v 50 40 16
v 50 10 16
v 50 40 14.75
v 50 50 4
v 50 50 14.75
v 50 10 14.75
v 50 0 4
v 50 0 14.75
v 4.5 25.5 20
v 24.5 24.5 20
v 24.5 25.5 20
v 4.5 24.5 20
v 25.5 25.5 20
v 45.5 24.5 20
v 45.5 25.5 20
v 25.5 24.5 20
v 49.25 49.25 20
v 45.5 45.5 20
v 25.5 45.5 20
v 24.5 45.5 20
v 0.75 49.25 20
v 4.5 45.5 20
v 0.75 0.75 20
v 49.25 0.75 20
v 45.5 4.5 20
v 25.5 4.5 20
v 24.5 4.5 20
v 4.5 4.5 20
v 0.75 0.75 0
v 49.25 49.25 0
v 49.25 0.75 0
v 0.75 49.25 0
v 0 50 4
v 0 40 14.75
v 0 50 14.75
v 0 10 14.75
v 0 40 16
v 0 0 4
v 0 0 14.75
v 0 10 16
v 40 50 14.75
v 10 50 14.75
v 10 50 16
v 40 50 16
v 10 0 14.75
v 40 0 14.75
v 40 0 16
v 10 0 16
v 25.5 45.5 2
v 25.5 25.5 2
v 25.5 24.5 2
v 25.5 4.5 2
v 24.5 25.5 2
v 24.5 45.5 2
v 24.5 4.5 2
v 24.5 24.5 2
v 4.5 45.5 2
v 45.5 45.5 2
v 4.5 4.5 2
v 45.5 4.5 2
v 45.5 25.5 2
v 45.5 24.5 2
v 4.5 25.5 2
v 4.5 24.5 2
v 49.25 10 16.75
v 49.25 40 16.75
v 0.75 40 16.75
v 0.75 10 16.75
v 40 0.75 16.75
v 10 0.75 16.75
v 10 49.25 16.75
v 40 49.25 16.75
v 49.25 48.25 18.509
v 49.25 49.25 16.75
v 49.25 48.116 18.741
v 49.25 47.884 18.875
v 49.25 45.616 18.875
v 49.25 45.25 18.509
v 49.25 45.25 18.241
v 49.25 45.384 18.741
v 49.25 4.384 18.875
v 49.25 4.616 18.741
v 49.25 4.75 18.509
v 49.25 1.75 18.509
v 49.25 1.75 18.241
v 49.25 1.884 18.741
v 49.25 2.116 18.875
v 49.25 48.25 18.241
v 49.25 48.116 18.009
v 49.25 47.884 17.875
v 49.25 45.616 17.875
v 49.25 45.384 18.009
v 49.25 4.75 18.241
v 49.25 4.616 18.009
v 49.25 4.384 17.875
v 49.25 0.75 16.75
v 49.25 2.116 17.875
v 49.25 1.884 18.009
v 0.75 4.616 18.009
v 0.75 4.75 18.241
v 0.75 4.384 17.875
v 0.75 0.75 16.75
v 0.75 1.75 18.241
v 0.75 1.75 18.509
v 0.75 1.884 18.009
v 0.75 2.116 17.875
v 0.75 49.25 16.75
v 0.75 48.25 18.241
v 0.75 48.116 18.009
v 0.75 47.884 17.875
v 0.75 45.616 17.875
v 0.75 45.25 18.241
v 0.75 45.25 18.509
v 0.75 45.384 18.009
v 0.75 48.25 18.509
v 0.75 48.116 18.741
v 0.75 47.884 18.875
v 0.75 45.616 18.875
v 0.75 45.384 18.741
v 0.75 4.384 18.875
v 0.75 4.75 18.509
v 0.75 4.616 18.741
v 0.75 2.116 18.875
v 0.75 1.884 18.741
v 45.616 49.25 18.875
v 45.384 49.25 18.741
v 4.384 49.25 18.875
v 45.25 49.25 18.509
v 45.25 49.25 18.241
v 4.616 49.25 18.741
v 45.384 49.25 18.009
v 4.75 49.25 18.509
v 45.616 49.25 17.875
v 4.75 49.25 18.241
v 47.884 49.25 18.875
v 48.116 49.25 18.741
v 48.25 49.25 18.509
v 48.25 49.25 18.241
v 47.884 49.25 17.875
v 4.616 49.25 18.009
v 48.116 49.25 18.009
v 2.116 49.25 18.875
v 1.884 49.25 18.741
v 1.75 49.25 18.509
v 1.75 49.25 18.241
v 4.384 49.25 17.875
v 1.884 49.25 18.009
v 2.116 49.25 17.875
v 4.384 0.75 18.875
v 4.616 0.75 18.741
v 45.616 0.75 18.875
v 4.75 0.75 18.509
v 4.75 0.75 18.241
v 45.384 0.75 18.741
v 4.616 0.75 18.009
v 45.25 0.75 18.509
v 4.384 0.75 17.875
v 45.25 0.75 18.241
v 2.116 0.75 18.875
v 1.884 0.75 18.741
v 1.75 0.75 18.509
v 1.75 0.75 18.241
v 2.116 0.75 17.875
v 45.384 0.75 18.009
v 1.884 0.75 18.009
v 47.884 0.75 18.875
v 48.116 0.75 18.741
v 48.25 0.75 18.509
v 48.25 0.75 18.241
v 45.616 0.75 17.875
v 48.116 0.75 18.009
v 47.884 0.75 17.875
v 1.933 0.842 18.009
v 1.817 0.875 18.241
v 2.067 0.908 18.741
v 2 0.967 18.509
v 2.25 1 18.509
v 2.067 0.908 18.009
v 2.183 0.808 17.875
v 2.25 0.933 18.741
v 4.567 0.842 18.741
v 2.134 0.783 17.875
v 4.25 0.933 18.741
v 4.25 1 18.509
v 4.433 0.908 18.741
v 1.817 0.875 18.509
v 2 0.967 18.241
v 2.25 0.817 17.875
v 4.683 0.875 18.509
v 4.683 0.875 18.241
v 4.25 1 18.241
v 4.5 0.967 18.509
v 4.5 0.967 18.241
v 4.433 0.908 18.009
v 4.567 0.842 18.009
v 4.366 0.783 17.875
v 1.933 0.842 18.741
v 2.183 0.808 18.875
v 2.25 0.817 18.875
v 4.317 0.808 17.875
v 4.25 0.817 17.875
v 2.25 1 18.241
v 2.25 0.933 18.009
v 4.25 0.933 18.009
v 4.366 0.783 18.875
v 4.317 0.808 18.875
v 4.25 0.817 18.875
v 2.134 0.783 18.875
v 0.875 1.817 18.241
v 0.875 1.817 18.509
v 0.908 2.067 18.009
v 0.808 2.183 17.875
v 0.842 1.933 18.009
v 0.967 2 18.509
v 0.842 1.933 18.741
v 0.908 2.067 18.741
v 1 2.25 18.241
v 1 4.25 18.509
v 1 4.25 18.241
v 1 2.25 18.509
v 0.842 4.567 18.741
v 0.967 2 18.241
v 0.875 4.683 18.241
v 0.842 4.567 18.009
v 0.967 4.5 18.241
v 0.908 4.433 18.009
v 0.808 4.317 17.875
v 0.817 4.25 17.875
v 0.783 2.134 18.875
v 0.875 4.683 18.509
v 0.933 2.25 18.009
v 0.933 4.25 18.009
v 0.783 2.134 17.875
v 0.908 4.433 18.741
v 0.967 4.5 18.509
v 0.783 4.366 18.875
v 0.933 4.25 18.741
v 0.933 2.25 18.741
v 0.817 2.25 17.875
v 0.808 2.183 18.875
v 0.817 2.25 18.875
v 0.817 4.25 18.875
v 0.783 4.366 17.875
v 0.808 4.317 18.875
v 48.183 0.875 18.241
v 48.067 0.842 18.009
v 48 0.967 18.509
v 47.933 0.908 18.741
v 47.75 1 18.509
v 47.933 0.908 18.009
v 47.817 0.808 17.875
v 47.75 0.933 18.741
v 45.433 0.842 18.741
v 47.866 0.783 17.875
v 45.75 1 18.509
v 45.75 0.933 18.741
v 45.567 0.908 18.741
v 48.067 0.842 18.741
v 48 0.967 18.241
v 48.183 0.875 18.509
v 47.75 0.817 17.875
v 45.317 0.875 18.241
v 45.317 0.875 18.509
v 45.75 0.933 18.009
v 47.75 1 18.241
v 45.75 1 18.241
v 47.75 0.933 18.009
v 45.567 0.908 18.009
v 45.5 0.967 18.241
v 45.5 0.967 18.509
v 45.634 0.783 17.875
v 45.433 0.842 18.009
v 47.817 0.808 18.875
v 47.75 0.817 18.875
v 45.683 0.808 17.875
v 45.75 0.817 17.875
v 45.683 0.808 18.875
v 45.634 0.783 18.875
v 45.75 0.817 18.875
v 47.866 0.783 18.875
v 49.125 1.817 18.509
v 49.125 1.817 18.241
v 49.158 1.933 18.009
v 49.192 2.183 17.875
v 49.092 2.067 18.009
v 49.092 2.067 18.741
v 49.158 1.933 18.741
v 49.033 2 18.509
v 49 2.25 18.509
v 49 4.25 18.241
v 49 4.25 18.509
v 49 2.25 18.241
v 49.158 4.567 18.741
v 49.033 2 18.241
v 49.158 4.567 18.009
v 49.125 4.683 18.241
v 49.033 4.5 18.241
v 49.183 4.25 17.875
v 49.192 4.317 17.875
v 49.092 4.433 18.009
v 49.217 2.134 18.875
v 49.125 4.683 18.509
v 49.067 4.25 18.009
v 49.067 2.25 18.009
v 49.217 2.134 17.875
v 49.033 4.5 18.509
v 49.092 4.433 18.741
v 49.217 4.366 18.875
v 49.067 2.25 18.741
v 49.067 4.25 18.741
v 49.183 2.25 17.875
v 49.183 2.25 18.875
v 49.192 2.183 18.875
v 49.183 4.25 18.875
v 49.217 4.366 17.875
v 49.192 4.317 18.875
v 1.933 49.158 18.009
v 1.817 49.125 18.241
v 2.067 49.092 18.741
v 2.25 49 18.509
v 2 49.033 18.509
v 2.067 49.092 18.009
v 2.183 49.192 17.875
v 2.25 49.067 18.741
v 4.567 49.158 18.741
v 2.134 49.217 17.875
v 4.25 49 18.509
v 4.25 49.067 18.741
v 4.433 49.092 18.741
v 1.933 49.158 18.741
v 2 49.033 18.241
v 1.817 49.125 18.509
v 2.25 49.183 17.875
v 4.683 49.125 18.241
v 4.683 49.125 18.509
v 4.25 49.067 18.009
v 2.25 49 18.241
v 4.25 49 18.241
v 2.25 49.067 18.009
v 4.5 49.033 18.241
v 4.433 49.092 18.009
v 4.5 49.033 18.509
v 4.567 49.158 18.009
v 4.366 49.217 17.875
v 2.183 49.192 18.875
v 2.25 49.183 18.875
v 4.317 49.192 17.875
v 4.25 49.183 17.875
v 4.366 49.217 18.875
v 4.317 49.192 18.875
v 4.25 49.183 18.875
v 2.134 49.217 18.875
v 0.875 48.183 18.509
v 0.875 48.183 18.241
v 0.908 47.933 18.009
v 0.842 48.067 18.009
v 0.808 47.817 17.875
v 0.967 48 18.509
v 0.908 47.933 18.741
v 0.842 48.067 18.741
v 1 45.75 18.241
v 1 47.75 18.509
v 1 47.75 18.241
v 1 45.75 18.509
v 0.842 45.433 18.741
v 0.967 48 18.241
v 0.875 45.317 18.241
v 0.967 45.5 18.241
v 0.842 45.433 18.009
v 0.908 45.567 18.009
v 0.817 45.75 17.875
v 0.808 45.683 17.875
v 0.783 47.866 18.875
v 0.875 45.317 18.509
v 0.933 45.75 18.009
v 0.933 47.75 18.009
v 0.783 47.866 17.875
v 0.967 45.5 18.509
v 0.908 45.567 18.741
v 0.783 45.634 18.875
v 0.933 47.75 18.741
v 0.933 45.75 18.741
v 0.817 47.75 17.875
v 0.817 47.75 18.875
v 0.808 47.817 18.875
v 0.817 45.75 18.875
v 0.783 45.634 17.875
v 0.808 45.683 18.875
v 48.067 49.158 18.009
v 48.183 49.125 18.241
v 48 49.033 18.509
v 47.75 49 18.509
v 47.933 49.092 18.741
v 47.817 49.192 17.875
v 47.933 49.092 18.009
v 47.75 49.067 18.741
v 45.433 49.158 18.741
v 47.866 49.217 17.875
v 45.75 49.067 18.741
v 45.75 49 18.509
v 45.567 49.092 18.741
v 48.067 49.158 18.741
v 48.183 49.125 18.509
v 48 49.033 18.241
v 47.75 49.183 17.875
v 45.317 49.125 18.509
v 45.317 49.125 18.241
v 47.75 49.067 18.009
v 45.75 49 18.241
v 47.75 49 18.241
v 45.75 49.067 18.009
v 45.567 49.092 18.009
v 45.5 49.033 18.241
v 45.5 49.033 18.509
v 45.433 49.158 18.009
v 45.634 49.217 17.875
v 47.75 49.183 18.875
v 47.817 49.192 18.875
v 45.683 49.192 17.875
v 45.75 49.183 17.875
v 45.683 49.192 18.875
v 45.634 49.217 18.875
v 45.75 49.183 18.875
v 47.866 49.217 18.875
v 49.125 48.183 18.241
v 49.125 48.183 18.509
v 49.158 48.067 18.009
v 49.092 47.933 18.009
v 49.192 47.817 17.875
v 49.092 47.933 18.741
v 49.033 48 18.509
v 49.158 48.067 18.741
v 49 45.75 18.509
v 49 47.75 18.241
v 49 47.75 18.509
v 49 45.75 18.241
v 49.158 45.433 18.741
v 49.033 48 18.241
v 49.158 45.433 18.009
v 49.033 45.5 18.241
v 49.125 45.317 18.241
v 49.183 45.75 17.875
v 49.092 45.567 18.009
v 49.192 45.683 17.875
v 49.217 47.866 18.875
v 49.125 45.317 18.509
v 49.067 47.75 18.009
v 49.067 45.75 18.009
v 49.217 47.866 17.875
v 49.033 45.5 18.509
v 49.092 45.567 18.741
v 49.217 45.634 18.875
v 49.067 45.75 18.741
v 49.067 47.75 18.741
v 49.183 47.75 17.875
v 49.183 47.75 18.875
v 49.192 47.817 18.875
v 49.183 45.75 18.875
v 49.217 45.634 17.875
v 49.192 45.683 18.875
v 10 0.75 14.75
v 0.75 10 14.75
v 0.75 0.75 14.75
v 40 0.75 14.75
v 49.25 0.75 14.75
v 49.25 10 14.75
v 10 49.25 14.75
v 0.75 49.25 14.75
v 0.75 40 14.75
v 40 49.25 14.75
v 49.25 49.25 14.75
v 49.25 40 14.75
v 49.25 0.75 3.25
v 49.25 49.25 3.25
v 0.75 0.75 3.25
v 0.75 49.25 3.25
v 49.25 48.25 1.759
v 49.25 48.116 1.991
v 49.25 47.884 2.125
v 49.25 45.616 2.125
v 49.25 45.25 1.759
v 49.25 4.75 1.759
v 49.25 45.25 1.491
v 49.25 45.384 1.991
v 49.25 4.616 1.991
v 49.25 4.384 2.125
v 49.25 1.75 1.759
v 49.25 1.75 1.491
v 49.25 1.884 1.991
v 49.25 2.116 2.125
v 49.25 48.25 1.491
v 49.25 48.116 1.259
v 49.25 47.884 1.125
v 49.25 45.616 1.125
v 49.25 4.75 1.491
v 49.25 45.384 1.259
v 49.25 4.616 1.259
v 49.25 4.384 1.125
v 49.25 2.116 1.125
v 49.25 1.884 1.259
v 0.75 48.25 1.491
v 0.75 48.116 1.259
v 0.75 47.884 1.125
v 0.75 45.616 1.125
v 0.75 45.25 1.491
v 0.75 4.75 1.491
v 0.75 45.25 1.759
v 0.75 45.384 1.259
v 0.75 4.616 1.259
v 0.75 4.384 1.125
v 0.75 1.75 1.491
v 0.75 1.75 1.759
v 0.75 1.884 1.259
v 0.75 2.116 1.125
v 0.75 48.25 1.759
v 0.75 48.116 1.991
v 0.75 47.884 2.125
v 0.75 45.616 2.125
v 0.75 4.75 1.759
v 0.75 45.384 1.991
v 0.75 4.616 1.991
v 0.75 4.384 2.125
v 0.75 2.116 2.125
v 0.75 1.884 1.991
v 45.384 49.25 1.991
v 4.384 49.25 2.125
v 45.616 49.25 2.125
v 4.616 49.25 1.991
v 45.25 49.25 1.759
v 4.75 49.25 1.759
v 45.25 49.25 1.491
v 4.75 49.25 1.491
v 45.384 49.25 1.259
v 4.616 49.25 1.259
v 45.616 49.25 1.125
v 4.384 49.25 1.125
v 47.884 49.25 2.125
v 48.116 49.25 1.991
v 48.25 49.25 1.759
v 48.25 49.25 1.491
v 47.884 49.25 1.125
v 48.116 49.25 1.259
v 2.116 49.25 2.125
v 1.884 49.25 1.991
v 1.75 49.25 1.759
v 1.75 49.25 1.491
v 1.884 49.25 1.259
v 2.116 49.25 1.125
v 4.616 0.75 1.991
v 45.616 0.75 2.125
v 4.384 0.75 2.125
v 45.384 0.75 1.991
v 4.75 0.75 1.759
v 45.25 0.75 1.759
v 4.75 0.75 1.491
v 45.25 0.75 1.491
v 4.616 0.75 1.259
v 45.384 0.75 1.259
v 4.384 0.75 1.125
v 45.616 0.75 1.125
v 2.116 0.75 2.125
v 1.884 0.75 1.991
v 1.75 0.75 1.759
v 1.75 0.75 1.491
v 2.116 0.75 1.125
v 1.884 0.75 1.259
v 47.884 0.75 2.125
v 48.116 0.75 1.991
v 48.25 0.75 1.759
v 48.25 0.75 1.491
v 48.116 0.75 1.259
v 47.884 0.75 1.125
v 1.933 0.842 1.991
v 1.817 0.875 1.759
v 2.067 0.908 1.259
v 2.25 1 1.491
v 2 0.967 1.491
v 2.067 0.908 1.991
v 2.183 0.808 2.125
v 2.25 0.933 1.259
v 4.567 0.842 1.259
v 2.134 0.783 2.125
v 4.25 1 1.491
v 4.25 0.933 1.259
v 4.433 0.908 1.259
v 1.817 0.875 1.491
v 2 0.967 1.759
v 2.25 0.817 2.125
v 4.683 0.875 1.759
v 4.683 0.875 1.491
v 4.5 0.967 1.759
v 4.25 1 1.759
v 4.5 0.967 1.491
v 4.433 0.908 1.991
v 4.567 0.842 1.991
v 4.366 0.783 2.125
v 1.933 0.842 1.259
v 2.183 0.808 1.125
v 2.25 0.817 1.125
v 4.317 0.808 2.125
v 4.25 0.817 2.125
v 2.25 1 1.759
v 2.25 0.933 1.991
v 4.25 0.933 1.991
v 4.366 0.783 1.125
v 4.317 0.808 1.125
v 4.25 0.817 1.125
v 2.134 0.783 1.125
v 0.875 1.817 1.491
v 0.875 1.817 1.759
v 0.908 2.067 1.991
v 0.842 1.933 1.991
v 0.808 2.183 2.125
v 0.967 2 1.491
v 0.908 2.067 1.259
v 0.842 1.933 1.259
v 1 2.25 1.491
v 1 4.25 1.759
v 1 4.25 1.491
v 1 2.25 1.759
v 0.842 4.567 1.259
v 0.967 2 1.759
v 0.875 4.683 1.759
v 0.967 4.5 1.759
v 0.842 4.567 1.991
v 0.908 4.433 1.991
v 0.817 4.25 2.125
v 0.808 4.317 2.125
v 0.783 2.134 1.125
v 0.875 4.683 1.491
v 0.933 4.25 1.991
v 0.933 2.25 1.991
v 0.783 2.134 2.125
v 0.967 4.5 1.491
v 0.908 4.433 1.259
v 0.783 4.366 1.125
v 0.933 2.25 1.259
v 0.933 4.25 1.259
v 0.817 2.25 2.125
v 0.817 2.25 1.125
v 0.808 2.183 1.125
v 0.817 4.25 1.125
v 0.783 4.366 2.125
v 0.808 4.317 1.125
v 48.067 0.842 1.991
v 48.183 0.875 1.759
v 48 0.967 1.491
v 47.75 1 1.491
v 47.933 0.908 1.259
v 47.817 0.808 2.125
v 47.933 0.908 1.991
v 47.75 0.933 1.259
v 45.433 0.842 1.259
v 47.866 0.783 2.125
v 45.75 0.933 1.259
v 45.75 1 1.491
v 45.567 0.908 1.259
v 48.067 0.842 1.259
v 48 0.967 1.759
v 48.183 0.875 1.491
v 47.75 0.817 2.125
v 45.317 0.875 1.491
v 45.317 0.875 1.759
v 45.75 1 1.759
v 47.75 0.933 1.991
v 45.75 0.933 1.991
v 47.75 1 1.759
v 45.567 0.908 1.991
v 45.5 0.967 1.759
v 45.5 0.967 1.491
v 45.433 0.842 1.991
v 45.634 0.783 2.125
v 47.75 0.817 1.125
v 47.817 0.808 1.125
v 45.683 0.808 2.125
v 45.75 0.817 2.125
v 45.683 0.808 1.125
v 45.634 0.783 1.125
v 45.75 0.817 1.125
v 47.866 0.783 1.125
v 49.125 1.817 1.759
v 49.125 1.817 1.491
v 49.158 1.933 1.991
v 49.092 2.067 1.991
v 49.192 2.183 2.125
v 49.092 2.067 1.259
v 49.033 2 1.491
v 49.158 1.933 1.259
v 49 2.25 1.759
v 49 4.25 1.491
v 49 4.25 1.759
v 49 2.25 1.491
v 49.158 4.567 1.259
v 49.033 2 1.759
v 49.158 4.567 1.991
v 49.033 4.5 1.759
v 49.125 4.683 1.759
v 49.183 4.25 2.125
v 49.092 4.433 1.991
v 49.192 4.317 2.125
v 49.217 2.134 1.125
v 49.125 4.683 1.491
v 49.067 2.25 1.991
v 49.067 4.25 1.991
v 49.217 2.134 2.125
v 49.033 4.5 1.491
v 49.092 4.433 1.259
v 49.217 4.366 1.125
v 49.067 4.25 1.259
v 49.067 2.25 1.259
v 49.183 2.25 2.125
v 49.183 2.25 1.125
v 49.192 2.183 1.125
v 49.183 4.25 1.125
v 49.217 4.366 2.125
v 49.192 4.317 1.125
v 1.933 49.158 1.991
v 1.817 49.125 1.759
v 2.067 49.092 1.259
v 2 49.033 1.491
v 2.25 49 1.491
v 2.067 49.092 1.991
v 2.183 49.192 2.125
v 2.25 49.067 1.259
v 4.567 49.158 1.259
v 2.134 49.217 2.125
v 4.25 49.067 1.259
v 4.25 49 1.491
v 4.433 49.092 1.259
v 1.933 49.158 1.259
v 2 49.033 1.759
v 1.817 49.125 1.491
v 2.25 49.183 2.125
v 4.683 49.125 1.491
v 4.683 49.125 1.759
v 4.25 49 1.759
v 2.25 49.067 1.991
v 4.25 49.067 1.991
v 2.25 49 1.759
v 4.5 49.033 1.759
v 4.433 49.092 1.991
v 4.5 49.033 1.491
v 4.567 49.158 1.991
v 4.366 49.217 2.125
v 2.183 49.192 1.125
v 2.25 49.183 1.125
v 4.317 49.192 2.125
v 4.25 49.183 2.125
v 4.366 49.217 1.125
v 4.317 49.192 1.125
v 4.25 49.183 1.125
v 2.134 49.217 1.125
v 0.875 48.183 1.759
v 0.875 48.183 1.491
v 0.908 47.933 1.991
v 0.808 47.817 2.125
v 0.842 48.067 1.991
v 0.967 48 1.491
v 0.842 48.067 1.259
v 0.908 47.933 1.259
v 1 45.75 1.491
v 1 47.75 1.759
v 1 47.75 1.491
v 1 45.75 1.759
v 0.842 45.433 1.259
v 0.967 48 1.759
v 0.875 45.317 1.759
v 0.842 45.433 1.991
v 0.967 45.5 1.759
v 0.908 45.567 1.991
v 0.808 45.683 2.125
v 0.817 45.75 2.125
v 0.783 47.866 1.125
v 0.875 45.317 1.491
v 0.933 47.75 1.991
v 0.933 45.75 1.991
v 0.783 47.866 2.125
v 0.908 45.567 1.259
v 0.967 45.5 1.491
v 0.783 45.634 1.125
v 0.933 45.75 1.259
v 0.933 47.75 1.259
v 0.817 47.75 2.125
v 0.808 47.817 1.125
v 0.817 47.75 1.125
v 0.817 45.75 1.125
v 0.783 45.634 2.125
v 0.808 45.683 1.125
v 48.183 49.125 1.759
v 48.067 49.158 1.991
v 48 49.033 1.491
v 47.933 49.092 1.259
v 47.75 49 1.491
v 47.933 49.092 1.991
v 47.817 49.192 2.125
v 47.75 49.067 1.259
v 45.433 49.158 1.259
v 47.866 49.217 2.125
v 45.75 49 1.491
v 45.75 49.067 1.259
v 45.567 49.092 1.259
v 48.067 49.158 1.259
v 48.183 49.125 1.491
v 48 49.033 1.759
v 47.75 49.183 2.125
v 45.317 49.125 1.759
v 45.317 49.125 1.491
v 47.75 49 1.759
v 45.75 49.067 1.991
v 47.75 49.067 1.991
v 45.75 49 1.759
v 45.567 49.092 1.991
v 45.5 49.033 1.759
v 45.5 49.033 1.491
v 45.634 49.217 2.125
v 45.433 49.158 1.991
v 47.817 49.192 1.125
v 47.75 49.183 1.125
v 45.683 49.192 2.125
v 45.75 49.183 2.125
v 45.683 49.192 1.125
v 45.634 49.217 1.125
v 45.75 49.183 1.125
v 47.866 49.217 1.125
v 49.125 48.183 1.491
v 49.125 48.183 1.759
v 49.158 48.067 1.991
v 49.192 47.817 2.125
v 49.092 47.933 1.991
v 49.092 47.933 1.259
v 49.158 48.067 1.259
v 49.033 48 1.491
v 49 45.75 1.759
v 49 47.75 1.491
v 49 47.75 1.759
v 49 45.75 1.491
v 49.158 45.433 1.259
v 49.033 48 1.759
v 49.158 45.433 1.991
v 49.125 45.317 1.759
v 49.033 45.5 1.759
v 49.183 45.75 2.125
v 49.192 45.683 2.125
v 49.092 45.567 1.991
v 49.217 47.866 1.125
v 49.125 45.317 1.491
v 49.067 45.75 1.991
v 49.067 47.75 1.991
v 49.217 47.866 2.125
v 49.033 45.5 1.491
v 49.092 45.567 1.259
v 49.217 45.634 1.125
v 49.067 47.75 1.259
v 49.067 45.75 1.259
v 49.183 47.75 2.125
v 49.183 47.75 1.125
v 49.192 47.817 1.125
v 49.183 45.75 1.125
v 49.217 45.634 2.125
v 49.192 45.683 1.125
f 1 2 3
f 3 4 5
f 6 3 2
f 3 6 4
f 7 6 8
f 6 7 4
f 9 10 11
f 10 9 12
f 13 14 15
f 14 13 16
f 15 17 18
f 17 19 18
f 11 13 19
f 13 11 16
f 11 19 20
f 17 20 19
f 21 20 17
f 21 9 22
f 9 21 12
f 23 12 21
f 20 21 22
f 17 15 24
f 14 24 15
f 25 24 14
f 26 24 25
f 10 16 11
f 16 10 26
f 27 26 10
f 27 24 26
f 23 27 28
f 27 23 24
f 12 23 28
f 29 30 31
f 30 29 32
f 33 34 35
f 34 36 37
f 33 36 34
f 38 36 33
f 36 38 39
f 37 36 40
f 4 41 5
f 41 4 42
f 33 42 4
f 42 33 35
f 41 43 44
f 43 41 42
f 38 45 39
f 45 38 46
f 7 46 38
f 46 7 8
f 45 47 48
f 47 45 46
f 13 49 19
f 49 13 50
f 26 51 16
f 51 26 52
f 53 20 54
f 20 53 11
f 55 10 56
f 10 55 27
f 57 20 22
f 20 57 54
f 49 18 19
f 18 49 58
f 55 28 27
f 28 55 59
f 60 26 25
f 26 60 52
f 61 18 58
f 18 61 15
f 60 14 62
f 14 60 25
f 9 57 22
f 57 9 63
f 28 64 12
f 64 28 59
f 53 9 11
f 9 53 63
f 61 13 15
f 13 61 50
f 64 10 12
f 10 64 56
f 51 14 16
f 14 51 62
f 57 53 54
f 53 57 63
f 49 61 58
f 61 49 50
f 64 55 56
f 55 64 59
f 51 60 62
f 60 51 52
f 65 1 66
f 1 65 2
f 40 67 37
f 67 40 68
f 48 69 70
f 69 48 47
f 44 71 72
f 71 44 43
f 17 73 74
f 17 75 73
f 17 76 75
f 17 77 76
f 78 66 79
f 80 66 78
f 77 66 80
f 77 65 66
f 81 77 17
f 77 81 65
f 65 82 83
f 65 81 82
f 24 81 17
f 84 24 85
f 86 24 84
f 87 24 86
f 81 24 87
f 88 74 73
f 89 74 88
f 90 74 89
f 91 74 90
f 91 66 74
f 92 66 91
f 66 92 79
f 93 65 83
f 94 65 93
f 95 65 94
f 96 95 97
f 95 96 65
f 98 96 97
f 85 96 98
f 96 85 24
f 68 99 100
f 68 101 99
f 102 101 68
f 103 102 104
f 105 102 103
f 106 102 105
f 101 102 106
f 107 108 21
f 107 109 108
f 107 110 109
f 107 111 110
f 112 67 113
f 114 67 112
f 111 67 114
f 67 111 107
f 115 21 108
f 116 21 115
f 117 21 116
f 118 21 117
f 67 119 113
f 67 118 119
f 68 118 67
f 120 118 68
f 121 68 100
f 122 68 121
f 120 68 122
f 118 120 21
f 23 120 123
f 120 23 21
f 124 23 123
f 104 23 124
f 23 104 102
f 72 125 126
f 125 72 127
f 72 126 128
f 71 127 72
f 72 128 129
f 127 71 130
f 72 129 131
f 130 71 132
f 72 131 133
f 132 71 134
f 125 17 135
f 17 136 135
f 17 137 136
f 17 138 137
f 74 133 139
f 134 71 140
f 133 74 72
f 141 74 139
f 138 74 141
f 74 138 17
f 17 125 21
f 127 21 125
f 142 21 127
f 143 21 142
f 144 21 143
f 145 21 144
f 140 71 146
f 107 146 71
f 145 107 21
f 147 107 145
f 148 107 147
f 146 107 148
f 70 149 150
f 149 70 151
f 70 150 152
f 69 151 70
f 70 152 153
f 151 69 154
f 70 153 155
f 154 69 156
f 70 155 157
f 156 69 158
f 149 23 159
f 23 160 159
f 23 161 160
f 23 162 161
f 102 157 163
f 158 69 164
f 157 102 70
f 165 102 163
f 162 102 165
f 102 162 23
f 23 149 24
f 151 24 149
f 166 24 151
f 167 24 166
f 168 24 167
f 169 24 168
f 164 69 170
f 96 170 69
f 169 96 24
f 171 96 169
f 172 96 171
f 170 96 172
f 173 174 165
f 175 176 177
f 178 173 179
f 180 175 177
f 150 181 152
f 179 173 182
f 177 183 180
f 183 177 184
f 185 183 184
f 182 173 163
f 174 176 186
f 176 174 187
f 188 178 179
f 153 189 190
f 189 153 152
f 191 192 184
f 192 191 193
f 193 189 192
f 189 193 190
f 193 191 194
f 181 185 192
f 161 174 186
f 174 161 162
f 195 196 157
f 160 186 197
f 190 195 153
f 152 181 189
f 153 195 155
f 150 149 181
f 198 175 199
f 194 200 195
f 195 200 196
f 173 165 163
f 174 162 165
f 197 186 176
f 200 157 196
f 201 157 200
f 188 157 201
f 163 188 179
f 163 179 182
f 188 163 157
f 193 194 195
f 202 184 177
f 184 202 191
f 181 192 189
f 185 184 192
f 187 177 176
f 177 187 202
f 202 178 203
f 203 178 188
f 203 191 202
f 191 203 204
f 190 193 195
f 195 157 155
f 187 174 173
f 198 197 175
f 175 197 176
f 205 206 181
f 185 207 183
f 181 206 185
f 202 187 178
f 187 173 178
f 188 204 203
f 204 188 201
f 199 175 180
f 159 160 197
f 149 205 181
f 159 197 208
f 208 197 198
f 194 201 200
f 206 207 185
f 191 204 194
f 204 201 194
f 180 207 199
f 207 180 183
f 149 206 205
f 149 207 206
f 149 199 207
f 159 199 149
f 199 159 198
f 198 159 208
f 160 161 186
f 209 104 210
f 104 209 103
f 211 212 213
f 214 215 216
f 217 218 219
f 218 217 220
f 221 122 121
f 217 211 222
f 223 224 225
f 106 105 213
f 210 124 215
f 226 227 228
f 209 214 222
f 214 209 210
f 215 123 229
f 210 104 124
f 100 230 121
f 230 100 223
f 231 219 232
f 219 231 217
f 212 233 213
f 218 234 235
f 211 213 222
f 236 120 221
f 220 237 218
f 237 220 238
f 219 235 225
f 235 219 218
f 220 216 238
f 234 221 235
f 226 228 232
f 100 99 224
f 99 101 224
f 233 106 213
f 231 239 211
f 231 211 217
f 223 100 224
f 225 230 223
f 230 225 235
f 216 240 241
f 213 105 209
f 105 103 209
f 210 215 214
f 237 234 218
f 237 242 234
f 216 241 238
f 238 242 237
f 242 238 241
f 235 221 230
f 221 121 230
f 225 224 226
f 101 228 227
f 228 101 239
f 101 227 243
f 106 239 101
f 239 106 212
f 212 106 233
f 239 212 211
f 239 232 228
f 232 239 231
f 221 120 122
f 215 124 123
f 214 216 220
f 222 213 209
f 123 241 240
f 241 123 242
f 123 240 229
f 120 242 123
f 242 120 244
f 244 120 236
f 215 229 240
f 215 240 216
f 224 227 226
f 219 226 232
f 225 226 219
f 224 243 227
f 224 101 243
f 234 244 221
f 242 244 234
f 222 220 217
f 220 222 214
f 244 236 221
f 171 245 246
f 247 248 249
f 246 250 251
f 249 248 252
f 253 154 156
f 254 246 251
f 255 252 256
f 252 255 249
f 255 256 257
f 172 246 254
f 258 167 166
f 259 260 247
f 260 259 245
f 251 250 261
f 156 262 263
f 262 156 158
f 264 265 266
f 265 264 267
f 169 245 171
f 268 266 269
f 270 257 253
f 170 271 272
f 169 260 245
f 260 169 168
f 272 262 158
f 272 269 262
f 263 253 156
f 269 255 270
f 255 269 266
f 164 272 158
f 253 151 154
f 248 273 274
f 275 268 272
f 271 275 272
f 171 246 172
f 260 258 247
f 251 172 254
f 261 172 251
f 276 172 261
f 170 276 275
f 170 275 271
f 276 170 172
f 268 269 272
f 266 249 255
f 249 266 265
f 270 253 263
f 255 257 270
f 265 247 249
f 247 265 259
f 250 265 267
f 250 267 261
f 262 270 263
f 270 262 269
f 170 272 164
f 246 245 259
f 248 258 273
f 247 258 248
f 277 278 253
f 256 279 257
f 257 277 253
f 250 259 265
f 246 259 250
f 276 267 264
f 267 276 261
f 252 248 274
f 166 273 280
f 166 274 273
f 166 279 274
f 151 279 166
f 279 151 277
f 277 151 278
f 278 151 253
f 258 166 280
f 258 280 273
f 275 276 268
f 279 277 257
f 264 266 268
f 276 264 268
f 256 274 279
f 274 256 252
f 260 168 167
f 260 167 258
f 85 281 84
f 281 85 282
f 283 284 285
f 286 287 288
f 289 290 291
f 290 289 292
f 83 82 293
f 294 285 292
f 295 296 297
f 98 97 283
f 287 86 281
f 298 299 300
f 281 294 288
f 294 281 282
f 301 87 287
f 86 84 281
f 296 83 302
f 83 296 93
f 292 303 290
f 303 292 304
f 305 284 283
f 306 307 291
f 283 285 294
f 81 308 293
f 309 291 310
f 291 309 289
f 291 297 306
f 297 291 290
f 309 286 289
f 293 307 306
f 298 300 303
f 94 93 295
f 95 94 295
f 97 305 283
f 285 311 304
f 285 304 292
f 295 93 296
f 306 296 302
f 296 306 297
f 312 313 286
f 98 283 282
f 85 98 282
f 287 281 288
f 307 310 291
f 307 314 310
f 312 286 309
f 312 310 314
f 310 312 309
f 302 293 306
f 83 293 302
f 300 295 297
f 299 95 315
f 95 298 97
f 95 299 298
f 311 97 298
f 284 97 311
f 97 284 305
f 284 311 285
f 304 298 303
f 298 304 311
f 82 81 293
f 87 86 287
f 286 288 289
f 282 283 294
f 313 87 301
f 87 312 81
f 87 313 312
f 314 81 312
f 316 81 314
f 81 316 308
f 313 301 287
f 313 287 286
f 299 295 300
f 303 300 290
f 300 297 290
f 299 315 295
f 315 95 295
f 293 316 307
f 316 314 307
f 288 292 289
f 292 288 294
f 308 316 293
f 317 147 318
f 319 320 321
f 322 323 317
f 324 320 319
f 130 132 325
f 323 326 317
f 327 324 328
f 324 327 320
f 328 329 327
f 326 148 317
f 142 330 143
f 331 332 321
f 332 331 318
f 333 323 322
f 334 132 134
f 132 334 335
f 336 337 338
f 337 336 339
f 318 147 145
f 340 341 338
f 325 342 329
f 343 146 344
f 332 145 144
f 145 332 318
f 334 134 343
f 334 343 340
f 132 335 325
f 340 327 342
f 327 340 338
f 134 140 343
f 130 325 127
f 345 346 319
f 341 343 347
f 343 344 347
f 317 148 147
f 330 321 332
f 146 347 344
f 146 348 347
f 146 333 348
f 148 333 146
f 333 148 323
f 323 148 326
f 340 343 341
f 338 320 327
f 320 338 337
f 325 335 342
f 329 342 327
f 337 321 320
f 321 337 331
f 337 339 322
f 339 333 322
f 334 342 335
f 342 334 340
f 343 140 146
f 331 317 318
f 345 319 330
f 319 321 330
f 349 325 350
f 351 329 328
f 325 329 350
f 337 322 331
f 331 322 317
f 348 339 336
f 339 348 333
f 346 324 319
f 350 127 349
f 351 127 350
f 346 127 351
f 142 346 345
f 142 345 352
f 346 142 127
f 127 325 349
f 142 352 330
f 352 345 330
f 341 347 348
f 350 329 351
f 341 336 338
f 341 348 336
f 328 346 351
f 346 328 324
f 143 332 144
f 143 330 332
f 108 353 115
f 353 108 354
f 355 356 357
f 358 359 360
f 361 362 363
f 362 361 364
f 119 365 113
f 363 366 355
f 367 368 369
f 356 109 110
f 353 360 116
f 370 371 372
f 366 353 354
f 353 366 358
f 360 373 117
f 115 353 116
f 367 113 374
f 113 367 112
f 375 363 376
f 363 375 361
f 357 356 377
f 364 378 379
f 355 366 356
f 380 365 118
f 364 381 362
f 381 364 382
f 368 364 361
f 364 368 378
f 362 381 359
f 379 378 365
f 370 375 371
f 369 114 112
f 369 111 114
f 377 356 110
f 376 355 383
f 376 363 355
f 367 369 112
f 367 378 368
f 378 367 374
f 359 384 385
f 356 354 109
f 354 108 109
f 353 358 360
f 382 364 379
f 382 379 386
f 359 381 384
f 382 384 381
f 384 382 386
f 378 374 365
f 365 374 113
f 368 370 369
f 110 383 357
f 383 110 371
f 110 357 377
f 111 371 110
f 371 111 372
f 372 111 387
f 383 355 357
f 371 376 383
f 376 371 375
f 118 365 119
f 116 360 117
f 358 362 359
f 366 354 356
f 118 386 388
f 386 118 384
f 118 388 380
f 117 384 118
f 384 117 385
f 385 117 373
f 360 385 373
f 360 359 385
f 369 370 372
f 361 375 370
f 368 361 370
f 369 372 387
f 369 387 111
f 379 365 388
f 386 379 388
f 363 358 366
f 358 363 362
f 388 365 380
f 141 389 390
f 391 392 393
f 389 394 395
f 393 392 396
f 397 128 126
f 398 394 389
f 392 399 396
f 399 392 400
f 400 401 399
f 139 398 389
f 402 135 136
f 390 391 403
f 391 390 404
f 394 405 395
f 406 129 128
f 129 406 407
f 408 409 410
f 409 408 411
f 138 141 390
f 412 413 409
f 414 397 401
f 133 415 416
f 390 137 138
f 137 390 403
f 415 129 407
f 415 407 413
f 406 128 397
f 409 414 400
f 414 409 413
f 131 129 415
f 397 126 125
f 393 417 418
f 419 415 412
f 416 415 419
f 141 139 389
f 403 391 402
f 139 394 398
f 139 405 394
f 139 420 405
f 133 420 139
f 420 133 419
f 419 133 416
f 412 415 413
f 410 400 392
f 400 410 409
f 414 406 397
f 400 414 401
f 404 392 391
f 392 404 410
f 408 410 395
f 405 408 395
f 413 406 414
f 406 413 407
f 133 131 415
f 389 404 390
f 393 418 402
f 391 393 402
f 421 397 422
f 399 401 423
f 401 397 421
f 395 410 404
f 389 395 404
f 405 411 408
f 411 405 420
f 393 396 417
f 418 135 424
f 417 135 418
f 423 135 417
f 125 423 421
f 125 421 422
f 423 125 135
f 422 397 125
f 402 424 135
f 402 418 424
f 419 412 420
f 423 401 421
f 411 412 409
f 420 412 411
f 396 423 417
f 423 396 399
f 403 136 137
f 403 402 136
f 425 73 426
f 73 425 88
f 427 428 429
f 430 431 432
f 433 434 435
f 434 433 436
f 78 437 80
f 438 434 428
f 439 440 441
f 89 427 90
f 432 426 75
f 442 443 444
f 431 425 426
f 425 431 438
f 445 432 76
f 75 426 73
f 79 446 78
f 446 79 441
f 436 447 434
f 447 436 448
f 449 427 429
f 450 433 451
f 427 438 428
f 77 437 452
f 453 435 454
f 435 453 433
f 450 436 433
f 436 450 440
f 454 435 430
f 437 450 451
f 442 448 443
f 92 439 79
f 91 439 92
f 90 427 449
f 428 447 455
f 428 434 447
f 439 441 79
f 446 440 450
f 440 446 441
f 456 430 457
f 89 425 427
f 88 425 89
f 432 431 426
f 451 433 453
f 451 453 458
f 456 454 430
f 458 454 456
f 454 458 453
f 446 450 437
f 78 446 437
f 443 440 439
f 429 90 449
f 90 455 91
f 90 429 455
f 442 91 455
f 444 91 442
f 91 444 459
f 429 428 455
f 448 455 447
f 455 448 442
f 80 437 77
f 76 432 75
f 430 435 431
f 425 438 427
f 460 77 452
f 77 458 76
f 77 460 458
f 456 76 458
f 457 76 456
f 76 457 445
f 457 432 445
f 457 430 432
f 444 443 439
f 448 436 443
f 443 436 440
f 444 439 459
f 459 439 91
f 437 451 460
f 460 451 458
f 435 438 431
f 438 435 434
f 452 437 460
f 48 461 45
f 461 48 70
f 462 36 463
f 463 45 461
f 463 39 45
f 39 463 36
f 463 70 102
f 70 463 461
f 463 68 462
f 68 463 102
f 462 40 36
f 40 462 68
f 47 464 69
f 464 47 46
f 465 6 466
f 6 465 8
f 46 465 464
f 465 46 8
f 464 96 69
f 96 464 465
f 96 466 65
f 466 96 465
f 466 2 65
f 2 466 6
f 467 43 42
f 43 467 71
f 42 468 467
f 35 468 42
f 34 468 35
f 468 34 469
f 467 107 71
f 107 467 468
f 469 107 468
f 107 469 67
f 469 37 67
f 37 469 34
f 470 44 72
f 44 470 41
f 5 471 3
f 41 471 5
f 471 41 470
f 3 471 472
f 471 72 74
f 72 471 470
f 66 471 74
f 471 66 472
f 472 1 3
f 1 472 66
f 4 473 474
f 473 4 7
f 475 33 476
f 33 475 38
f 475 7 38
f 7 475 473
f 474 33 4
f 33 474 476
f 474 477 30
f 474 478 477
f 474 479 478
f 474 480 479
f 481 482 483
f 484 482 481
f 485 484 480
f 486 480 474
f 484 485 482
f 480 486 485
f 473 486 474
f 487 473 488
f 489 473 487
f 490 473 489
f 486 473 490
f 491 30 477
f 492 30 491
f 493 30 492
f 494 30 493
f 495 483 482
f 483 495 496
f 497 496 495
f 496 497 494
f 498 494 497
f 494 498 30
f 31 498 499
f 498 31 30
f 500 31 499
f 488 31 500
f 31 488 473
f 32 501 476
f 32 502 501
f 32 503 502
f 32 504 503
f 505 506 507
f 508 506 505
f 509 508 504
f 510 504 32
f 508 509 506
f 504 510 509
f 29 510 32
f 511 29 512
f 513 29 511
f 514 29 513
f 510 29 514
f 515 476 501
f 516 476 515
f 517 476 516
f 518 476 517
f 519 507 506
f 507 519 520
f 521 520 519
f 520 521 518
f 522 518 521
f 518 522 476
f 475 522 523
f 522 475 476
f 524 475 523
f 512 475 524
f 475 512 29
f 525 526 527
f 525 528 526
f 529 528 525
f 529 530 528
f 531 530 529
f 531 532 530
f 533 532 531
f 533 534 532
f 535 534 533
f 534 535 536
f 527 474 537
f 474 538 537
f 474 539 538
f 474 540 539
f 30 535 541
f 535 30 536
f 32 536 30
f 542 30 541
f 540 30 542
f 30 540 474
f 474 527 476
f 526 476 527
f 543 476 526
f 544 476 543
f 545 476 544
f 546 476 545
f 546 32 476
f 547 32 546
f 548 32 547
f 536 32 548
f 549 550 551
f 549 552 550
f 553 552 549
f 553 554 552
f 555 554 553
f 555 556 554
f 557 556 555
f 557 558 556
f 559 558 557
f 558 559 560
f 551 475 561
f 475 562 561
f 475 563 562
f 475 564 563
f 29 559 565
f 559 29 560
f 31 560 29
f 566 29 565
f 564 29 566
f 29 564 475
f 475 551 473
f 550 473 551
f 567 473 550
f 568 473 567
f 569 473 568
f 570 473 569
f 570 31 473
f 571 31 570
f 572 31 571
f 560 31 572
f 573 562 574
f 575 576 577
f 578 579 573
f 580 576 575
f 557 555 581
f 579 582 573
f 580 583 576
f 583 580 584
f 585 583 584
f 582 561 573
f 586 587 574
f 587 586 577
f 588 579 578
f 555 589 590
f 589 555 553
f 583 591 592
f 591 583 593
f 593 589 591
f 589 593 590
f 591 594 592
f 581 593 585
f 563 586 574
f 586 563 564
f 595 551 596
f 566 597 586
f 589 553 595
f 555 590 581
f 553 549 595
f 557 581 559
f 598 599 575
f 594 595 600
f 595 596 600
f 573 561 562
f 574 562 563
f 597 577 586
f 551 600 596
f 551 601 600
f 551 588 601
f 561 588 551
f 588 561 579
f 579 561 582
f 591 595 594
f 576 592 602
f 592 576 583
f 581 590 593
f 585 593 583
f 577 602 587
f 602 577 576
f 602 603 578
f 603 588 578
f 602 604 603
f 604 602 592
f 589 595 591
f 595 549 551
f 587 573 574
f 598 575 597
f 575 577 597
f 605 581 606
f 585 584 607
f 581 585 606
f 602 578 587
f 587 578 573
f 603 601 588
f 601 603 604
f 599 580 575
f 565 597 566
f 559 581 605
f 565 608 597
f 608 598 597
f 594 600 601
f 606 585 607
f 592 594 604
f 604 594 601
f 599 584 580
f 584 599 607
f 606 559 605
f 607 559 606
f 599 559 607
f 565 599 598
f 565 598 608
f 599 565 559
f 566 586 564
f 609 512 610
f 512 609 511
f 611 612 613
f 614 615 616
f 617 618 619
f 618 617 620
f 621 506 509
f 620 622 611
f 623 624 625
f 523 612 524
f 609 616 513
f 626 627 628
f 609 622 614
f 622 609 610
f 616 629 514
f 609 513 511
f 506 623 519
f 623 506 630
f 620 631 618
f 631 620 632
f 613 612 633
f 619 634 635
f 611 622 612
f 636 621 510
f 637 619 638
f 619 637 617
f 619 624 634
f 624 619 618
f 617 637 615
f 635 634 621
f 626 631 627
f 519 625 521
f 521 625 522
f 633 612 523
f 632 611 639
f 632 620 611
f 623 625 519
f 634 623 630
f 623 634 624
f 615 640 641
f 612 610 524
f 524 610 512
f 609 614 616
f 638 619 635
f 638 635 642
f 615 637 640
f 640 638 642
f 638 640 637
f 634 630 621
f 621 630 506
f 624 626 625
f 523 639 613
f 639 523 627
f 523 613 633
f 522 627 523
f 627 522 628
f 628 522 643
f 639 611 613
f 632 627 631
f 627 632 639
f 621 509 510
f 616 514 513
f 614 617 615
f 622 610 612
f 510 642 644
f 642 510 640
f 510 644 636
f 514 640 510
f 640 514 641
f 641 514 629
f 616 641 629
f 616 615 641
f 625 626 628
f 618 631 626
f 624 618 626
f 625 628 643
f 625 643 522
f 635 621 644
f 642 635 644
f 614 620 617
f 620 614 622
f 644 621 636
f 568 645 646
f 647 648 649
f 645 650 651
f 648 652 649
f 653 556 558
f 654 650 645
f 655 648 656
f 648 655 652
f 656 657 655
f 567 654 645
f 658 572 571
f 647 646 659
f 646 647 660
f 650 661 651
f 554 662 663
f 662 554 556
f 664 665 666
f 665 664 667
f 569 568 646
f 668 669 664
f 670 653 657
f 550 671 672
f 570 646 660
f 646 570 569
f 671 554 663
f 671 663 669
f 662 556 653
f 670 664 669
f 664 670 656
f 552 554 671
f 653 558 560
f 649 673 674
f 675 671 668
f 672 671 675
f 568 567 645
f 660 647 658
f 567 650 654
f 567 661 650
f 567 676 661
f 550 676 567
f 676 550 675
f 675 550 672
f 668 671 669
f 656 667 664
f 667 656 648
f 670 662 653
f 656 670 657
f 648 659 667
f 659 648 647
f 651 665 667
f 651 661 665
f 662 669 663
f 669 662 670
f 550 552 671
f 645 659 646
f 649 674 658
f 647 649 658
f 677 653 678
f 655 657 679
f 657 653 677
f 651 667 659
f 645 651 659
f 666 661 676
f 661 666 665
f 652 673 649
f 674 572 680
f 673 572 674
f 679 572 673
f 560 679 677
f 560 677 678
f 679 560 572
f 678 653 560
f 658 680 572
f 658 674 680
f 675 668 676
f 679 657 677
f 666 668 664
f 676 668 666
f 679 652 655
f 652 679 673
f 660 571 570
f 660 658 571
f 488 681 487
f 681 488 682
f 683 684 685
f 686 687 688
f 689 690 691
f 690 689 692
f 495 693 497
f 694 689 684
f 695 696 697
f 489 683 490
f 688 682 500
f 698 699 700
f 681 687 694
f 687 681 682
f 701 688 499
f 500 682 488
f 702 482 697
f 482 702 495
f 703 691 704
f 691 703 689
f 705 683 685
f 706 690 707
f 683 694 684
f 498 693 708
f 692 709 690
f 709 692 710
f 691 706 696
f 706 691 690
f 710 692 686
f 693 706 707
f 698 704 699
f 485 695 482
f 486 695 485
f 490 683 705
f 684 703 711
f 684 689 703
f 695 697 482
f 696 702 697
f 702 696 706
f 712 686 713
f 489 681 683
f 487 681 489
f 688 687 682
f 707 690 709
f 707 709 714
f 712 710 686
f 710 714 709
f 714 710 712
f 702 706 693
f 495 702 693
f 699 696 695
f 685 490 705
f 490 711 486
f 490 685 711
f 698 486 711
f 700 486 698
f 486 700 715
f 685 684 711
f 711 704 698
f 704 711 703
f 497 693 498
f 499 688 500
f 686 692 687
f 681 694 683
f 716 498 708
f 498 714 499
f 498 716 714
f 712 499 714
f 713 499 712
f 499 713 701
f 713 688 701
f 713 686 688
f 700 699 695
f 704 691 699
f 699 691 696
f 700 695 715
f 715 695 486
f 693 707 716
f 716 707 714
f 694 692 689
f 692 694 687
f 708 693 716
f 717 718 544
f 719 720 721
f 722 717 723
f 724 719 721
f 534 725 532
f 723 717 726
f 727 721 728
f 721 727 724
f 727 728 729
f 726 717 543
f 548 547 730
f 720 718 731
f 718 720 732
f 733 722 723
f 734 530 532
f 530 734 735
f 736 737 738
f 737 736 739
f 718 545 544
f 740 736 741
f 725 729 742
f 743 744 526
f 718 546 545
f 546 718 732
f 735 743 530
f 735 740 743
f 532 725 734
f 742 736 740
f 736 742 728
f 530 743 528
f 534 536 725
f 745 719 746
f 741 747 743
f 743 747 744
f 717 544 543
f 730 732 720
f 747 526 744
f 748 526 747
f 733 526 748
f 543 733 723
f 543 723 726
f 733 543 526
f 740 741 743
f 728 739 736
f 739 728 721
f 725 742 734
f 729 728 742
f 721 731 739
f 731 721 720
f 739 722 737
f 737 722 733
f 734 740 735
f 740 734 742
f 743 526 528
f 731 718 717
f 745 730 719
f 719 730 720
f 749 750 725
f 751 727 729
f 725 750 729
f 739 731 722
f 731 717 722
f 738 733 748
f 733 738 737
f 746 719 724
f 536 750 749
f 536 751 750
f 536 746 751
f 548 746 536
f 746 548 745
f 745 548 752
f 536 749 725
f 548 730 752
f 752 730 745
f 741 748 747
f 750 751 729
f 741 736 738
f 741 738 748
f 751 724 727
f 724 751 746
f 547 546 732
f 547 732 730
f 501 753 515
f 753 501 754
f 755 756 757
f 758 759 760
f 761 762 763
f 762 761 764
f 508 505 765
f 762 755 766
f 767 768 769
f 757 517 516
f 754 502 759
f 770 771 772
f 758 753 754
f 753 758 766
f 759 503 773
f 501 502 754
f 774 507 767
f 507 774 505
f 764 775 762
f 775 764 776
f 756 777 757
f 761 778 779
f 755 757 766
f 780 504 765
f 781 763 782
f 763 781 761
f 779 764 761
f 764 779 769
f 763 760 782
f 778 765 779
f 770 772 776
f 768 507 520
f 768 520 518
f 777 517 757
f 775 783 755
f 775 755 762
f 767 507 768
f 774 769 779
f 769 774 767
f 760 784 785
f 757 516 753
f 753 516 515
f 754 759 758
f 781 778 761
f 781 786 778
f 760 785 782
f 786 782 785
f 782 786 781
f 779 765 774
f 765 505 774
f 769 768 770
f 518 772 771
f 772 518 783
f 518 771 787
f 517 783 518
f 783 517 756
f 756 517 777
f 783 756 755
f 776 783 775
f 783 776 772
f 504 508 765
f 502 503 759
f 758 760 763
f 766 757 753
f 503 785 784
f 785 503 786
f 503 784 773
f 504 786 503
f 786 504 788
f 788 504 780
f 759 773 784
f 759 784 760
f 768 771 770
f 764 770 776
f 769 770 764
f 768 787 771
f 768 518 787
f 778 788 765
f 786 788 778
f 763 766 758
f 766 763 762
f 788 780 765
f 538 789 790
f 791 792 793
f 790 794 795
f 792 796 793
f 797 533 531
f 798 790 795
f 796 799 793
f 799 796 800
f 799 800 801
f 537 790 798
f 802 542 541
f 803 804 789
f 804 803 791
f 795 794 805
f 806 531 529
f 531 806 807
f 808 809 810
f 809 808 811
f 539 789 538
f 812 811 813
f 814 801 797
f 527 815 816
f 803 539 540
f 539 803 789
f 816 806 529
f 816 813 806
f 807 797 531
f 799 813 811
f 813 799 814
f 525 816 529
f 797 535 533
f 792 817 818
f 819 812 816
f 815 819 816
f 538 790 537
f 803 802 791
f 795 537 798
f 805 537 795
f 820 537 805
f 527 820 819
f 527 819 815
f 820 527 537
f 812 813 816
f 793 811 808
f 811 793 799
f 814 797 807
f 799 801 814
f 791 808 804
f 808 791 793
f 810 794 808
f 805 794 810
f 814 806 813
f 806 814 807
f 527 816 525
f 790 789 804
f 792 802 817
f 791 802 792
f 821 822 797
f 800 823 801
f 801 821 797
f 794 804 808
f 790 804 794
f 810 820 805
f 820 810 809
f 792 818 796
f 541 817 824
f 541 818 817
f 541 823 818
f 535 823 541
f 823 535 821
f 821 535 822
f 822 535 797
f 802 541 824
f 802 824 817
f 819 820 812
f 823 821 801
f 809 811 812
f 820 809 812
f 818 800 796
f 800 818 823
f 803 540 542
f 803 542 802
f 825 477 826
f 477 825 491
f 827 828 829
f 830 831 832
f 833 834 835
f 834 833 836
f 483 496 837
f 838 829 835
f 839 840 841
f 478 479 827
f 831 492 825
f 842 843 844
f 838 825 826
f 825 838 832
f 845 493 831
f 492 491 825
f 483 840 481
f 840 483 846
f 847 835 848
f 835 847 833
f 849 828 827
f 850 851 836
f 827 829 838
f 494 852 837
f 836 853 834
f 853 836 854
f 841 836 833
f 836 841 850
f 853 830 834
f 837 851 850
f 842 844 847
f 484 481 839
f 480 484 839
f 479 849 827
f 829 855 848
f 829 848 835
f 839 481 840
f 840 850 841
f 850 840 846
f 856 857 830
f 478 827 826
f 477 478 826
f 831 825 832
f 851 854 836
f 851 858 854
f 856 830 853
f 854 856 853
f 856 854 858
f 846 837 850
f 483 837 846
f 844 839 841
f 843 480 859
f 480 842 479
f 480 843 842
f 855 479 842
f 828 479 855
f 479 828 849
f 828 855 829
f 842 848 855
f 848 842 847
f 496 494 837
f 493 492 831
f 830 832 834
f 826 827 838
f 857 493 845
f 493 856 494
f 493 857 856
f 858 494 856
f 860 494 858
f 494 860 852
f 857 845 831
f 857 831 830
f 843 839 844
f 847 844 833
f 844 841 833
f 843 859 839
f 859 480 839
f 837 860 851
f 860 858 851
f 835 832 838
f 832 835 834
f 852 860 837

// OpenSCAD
// Test: SQUARE compartment shape (default)
include <../boardgame_insert_toolkit_lib.3.scad>;

g_b_print_lid = false;
g_b_print_box = true;
g_isolated_print_box = "";

data = [
    [ "square default",
        [
            [ BOX_SIZE_XYZ, [50, 50, 20] ],
            [ BOX_COMPONENT,
                [
                    [ CMP_NUM_COMPARTMENTS_XY, [2, 2] ],
                    [ CMP_COMPARTMENT_SIZE_XYZ, [20, 20, 18] ],
                    [ CMP_SHAPE, SQUARE ],
                ]
            ]
        ]
    ],
];

MakeAll();
